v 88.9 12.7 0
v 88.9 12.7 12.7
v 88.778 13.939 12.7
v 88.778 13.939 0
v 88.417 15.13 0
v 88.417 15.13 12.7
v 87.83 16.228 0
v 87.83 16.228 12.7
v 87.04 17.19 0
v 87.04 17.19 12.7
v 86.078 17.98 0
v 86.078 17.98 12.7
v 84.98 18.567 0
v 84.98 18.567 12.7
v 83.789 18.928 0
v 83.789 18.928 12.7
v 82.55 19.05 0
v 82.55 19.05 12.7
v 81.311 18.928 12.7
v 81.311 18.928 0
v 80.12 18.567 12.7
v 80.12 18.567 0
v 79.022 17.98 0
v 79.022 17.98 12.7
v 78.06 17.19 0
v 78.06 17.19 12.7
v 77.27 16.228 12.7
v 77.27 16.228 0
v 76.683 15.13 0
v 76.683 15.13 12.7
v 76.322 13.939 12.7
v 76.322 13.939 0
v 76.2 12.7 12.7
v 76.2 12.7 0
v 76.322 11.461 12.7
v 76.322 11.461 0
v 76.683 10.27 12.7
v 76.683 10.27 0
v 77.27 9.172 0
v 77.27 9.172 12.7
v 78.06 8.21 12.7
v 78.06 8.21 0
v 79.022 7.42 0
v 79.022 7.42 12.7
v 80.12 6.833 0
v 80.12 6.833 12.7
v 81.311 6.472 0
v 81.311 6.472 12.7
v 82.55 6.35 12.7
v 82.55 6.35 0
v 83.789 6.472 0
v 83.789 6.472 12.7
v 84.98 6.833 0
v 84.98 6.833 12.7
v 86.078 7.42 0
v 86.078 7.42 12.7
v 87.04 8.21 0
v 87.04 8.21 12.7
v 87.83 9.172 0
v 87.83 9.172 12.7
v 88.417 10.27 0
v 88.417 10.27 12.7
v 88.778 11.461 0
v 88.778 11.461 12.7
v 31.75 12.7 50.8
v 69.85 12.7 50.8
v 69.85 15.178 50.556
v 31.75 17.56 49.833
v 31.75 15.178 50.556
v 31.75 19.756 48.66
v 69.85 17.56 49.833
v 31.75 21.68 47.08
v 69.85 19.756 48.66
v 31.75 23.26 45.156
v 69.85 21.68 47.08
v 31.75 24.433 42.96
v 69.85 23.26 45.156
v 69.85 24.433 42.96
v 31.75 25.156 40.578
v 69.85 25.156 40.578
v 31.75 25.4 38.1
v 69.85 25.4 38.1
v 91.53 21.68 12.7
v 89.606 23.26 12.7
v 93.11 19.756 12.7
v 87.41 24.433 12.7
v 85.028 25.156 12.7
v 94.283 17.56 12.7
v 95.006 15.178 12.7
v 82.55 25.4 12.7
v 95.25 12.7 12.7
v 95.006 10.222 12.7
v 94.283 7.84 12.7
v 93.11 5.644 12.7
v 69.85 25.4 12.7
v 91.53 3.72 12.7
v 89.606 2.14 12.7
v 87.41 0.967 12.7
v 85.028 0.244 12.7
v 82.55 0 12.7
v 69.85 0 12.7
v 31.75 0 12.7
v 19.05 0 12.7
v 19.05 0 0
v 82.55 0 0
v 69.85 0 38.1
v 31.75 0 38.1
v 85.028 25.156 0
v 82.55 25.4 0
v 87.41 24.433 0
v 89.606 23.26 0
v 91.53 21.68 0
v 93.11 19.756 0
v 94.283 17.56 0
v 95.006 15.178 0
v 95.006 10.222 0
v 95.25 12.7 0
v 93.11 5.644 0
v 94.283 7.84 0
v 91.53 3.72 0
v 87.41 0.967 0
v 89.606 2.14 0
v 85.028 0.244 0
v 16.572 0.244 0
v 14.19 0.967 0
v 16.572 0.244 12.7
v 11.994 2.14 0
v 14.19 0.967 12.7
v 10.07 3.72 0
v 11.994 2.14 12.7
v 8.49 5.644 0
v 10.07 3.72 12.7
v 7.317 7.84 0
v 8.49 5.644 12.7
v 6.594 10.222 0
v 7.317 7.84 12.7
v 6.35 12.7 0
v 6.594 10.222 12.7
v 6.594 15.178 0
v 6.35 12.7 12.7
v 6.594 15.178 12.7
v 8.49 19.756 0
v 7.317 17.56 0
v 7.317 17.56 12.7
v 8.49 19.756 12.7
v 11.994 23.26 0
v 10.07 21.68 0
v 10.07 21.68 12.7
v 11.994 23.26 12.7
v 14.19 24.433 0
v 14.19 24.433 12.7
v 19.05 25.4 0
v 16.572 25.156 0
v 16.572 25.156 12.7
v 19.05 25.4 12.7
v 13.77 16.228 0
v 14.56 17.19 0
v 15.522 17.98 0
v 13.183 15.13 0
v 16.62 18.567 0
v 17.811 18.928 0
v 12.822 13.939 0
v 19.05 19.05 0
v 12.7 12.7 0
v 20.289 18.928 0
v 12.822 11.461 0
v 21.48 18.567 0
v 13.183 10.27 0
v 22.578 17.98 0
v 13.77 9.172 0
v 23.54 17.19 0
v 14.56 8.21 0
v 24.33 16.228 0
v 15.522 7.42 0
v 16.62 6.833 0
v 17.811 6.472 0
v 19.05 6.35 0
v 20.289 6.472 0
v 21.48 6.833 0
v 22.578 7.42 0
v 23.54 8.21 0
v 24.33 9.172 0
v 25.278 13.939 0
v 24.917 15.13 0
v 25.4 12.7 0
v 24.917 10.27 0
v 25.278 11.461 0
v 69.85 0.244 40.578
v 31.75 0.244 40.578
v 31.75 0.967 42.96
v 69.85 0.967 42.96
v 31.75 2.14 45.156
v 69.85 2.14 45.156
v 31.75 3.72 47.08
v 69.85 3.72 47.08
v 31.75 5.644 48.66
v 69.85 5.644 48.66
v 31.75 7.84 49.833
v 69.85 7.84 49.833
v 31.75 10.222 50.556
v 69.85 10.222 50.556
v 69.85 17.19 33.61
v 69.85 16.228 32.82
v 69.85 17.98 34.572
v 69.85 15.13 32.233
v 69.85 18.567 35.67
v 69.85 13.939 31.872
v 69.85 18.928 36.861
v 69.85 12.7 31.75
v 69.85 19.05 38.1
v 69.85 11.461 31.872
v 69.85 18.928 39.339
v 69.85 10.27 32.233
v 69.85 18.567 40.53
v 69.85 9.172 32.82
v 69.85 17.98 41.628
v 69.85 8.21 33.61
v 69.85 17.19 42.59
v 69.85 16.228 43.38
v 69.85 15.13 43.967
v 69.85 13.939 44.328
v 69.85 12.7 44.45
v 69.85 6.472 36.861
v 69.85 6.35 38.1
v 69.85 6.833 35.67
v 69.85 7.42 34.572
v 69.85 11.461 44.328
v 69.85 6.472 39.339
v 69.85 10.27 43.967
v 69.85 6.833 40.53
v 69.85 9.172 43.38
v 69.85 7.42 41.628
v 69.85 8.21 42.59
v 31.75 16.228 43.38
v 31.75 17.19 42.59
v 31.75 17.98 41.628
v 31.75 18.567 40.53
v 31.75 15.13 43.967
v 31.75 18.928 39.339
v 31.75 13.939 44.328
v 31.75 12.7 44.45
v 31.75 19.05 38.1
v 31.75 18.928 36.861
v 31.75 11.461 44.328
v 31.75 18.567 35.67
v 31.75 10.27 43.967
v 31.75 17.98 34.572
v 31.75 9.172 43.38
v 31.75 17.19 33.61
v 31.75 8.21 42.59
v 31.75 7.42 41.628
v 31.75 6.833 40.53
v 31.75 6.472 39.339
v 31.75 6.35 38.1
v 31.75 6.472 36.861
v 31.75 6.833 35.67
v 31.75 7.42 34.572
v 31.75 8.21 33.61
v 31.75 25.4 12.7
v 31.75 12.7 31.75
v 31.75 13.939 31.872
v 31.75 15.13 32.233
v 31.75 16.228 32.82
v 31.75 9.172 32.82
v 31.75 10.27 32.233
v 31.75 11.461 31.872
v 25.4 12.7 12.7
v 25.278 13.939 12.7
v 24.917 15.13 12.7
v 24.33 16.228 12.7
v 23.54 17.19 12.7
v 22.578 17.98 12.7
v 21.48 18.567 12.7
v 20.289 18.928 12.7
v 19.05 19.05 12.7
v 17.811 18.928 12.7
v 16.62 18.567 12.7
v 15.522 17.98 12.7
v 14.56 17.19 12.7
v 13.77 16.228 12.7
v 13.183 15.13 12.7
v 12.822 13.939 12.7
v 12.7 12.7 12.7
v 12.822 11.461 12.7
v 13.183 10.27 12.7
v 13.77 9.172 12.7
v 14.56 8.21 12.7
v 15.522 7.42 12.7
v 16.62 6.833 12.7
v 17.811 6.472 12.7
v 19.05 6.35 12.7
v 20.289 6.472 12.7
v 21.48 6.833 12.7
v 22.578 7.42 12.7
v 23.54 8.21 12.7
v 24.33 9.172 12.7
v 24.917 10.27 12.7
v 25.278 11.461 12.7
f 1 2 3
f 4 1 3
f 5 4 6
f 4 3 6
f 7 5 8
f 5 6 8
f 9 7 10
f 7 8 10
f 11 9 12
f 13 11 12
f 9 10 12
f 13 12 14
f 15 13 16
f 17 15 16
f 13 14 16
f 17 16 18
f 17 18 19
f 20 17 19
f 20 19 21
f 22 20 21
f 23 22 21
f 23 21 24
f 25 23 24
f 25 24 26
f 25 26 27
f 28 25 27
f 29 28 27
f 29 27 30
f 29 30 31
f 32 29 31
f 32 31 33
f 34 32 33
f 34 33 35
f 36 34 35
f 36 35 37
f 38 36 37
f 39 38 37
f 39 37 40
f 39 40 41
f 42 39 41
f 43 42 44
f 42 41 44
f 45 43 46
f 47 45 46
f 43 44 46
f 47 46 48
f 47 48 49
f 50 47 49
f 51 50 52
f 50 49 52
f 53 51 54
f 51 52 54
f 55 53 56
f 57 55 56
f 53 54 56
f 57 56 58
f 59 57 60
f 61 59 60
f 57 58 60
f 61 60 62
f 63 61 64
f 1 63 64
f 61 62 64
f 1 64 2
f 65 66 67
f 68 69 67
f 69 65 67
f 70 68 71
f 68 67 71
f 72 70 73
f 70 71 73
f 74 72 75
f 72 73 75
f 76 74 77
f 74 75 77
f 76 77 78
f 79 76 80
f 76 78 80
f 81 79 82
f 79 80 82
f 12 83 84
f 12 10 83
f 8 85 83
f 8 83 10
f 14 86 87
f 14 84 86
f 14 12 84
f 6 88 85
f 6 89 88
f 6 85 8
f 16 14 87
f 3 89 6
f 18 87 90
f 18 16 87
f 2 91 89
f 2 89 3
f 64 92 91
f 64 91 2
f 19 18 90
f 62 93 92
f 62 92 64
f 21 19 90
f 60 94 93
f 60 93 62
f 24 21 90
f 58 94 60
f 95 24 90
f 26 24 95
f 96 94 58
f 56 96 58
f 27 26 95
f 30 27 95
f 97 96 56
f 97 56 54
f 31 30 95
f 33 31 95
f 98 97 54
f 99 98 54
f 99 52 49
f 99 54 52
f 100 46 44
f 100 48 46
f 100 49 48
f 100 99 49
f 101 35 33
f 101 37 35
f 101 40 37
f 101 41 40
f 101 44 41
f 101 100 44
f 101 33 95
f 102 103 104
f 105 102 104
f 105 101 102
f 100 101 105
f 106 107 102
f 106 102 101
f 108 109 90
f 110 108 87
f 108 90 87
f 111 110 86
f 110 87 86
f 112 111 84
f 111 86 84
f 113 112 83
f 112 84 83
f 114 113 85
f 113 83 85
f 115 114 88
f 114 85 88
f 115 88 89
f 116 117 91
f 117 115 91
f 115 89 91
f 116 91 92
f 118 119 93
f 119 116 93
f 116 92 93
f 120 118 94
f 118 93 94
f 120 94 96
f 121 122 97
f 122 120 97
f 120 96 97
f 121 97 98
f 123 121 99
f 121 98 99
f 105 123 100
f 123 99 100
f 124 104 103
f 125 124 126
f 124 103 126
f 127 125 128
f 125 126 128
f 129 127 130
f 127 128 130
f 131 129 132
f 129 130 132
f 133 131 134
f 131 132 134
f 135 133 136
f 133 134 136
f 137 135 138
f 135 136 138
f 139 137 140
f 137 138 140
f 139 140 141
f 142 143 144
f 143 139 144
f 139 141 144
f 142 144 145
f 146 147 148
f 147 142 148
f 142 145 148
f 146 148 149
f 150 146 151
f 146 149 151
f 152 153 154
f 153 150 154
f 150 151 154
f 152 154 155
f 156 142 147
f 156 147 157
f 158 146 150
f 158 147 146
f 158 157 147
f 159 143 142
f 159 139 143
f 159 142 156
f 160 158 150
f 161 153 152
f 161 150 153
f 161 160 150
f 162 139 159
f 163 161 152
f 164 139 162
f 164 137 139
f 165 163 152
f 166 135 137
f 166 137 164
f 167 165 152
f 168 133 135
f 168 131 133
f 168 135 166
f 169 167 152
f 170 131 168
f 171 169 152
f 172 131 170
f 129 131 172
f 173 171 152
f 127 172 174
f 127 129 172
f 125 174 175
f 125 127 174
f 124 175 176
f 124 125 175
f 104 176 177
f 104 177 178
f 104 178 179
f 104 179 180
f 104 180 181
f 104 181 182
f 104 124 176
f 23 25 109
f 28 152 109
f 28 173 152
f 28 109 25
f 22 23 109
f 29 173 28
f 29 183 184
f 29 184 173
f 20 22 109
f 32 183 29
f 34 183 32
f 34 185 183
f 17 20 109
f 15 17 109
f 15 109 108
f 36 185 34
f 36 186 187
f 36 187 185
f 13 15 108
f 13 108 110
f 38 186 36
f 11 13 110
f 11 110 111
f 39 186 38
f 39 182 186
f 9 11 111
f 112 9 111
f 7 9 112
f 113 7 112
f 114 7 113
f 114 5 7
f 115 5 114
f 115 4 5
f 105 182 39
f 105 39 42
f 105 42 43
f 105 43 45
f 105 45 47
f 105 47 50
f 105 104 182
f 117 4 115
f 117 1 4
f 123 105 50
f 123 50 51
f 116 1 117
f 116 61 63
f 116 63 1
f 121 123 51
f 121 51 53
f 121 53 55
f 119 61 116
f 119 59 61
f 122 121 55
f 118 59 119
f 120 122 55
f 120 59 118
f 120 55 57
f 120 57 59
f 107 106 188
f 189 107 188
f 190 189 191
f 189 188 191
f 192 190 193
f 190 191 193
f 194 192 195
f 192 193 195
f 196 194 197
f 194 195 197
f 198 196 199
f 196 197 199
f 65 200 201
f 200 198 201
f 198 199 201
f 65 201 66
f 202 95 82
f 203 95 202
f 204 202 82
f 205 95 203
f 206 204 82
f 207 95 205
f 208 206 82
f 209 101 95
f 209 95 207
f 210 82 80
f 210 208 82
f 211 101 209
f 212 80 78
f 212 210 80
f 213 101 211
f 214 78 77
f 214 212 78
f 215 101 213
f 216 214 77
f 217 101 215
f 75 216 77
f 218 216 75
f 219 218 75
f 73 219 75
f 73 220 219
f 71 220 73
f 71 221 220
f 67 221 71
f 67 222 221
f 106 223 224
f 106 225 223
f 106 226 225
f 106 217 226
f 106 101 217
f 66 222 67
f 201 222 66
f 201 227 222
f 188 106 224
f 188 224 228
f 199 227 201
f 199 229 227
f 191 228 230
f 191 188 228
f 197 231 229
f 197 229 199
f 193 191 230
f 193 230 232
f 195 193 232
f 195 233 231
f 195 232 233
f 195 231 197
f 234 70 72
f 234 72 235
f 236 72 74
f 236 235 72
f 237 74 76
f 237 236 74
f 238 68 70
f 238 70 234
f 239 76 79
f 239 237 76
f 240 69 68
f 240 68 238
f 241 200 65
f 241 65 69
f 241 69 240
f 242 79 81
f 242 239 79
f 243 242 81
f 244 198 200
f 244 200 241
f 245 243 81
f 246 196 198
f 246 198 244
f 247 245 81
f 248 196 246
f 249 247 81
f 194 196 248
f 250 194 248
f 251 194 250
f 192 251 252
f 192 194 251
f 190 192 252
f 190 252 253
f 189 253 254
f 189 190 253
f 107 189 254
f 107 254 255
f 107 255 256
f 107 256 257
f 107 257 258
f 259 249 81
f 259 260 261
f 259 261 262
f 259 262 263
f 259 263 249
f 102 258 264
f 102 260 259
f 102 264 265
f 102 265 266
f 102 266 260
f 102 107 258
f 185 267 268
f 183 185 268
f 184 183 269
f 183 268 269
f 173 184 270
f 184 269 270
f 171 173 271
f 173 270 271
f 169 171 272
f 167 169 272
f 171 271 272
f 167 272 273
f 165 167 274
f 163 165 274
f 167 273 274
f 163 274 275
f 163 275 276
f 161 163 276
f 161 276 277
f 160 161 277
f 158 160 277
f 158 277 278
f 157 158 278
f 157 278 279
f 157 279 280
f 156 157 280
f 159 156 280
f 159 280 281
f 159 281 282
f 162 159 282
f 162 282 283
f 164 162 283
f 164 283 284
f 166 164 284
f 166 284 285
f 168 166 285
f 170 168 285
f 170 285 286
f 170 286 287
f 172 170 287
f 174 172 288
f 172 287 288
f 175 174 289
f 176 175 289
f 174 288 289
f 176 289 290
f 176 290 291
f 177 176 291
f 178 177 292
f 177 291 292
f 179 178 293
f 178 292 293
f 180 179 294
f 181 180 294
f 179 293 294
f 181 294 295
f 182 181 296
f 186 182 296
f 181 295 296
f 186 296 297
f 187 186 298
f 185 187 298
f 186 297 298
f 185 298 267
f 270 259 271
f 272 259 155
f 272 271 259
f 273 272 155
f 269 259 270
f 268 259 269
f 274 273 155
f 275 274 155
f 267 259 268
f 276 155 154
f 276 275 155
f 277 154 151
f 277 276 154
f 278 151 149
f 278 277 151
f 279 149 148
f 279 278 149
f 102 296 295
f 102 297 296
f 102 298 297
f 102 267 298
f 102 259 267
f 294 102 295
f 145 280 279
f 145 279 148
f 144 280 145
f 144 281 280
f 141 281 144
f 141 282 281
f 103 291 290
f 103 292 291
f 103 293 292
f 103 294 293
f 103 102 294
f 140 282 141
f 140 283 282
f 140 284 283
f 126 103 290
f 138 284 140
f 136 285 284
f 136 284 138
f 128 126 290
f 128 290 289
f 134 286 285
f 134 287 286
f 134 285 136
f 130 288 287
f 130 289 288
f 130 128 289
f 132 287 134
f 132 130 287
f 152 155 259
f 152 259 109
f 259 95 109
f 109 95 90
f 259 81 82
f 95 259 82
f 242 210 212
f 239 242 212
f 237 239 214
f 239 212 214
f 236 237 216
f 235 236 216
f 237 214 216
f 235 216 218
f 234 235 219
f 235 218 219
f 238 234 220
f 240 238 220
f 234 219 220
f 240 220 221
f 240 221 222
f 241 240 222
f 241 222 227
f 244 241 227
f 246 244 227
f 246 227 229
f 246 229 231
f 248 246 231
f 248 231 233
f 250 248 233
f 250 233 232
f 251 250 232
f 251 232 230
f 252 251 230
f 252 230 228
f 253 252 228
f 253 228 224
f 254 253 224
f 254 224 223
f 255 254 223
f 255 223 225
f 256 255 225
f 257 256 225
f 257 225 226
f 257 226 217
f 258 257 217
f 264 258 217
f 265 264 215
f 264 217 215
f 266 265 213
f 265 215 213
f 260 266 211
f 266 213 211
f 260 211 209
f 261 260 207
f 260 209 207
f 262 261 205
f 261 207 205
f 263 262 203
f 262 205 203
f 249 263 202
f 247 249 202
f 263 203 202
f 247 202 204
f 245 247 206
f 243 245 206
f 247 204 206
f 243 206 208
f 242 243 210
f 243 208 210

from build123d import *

# Parameters (mm, degrees)
F1_DEPTH = 25.4
F2_R     = 6.35
F3_DEPTH = 25.4
F4_R     = 6.35
F5_DEPTH = 49.276
F6_R     = 6.35
F7_DEPTH = 25.4


with BuildPart() as f1:
    # F0 (on Front) → F1 (new body)
    with BuildSketch(Plane.XZ):
        Polygon((0, 12.7), (0, 0), (101.6, 0), (101.6, 12.7), (69.85, 12.7), (69.85, 50.8), (31.75, 50.8), (31.75, 12.7), align=None)
    extrude(amount=-F1_DEPTH)

    # F2 (on face) → F3 (cut)
    with BuildSketch(Plane.XY.offset(12.7)):
        with Locations((82.55, 12.7)):
            Circle(F2_R)
        with BuildLine():
            ThreePointArc((82.55, 25.4), (95.25, 12.7), (82.55, 0))
            Line((82.55, 0), (101.6, 0))
            Line((101.6, 0), (101.6, 25.4))
            Line((101.6, 25.4), (82.55, 25.4))
        make_face()
    extrude(amount=-F3_DEPTH, mode=Mode.SUBTRACT)

    # F4 (on face) → F5 (cut)
    with BuildSketch(Plane.YZ.offset(69.85)):
        with Locations((12.7, 38.1)):
            Circle(F4_R)
        with BuildLine():
            ThreePointArc((12.7, 50.8), (21.680256, 47.080256), (25.4, 38.1))
            Line((25.4, 38.1), (25.4, 50.8))
            Line((25.4, 50.8), (12.7, 50.8))
        make_face()
        with BuildLine():
            ThreePointArc((0, 38.1), (3.719744, 47.080256), (12.7, 50.8))
            Line((12.7, 50.8), (0, 50.8))
            Line((0, 50.8), (0, 38.1))
        make_face()
    extrude(amount=-F5_DEPTH, mode=Mode.SUBTRACT)

    # F6 (on face) → F7 (cut)
    with BuildSketch(Plane.XY.offset(12.7)):
        with BuildLine():
            ThreePointArc((19.05, 0), (6.35, 12.7), (19.05, 25.4))
            Line((19.05, 25.4), (0, 25.4))
            Line((0, 25.4), (0, 0))
            Line((0, 0), (19.05, 0))
        make_face()
        with Locations((19.05, 12.7)):
            Circle(F6_R)
    extrude(amount=-F7_DEPTH, mode=Mode.SUBTRACT)


solid = f1.part
